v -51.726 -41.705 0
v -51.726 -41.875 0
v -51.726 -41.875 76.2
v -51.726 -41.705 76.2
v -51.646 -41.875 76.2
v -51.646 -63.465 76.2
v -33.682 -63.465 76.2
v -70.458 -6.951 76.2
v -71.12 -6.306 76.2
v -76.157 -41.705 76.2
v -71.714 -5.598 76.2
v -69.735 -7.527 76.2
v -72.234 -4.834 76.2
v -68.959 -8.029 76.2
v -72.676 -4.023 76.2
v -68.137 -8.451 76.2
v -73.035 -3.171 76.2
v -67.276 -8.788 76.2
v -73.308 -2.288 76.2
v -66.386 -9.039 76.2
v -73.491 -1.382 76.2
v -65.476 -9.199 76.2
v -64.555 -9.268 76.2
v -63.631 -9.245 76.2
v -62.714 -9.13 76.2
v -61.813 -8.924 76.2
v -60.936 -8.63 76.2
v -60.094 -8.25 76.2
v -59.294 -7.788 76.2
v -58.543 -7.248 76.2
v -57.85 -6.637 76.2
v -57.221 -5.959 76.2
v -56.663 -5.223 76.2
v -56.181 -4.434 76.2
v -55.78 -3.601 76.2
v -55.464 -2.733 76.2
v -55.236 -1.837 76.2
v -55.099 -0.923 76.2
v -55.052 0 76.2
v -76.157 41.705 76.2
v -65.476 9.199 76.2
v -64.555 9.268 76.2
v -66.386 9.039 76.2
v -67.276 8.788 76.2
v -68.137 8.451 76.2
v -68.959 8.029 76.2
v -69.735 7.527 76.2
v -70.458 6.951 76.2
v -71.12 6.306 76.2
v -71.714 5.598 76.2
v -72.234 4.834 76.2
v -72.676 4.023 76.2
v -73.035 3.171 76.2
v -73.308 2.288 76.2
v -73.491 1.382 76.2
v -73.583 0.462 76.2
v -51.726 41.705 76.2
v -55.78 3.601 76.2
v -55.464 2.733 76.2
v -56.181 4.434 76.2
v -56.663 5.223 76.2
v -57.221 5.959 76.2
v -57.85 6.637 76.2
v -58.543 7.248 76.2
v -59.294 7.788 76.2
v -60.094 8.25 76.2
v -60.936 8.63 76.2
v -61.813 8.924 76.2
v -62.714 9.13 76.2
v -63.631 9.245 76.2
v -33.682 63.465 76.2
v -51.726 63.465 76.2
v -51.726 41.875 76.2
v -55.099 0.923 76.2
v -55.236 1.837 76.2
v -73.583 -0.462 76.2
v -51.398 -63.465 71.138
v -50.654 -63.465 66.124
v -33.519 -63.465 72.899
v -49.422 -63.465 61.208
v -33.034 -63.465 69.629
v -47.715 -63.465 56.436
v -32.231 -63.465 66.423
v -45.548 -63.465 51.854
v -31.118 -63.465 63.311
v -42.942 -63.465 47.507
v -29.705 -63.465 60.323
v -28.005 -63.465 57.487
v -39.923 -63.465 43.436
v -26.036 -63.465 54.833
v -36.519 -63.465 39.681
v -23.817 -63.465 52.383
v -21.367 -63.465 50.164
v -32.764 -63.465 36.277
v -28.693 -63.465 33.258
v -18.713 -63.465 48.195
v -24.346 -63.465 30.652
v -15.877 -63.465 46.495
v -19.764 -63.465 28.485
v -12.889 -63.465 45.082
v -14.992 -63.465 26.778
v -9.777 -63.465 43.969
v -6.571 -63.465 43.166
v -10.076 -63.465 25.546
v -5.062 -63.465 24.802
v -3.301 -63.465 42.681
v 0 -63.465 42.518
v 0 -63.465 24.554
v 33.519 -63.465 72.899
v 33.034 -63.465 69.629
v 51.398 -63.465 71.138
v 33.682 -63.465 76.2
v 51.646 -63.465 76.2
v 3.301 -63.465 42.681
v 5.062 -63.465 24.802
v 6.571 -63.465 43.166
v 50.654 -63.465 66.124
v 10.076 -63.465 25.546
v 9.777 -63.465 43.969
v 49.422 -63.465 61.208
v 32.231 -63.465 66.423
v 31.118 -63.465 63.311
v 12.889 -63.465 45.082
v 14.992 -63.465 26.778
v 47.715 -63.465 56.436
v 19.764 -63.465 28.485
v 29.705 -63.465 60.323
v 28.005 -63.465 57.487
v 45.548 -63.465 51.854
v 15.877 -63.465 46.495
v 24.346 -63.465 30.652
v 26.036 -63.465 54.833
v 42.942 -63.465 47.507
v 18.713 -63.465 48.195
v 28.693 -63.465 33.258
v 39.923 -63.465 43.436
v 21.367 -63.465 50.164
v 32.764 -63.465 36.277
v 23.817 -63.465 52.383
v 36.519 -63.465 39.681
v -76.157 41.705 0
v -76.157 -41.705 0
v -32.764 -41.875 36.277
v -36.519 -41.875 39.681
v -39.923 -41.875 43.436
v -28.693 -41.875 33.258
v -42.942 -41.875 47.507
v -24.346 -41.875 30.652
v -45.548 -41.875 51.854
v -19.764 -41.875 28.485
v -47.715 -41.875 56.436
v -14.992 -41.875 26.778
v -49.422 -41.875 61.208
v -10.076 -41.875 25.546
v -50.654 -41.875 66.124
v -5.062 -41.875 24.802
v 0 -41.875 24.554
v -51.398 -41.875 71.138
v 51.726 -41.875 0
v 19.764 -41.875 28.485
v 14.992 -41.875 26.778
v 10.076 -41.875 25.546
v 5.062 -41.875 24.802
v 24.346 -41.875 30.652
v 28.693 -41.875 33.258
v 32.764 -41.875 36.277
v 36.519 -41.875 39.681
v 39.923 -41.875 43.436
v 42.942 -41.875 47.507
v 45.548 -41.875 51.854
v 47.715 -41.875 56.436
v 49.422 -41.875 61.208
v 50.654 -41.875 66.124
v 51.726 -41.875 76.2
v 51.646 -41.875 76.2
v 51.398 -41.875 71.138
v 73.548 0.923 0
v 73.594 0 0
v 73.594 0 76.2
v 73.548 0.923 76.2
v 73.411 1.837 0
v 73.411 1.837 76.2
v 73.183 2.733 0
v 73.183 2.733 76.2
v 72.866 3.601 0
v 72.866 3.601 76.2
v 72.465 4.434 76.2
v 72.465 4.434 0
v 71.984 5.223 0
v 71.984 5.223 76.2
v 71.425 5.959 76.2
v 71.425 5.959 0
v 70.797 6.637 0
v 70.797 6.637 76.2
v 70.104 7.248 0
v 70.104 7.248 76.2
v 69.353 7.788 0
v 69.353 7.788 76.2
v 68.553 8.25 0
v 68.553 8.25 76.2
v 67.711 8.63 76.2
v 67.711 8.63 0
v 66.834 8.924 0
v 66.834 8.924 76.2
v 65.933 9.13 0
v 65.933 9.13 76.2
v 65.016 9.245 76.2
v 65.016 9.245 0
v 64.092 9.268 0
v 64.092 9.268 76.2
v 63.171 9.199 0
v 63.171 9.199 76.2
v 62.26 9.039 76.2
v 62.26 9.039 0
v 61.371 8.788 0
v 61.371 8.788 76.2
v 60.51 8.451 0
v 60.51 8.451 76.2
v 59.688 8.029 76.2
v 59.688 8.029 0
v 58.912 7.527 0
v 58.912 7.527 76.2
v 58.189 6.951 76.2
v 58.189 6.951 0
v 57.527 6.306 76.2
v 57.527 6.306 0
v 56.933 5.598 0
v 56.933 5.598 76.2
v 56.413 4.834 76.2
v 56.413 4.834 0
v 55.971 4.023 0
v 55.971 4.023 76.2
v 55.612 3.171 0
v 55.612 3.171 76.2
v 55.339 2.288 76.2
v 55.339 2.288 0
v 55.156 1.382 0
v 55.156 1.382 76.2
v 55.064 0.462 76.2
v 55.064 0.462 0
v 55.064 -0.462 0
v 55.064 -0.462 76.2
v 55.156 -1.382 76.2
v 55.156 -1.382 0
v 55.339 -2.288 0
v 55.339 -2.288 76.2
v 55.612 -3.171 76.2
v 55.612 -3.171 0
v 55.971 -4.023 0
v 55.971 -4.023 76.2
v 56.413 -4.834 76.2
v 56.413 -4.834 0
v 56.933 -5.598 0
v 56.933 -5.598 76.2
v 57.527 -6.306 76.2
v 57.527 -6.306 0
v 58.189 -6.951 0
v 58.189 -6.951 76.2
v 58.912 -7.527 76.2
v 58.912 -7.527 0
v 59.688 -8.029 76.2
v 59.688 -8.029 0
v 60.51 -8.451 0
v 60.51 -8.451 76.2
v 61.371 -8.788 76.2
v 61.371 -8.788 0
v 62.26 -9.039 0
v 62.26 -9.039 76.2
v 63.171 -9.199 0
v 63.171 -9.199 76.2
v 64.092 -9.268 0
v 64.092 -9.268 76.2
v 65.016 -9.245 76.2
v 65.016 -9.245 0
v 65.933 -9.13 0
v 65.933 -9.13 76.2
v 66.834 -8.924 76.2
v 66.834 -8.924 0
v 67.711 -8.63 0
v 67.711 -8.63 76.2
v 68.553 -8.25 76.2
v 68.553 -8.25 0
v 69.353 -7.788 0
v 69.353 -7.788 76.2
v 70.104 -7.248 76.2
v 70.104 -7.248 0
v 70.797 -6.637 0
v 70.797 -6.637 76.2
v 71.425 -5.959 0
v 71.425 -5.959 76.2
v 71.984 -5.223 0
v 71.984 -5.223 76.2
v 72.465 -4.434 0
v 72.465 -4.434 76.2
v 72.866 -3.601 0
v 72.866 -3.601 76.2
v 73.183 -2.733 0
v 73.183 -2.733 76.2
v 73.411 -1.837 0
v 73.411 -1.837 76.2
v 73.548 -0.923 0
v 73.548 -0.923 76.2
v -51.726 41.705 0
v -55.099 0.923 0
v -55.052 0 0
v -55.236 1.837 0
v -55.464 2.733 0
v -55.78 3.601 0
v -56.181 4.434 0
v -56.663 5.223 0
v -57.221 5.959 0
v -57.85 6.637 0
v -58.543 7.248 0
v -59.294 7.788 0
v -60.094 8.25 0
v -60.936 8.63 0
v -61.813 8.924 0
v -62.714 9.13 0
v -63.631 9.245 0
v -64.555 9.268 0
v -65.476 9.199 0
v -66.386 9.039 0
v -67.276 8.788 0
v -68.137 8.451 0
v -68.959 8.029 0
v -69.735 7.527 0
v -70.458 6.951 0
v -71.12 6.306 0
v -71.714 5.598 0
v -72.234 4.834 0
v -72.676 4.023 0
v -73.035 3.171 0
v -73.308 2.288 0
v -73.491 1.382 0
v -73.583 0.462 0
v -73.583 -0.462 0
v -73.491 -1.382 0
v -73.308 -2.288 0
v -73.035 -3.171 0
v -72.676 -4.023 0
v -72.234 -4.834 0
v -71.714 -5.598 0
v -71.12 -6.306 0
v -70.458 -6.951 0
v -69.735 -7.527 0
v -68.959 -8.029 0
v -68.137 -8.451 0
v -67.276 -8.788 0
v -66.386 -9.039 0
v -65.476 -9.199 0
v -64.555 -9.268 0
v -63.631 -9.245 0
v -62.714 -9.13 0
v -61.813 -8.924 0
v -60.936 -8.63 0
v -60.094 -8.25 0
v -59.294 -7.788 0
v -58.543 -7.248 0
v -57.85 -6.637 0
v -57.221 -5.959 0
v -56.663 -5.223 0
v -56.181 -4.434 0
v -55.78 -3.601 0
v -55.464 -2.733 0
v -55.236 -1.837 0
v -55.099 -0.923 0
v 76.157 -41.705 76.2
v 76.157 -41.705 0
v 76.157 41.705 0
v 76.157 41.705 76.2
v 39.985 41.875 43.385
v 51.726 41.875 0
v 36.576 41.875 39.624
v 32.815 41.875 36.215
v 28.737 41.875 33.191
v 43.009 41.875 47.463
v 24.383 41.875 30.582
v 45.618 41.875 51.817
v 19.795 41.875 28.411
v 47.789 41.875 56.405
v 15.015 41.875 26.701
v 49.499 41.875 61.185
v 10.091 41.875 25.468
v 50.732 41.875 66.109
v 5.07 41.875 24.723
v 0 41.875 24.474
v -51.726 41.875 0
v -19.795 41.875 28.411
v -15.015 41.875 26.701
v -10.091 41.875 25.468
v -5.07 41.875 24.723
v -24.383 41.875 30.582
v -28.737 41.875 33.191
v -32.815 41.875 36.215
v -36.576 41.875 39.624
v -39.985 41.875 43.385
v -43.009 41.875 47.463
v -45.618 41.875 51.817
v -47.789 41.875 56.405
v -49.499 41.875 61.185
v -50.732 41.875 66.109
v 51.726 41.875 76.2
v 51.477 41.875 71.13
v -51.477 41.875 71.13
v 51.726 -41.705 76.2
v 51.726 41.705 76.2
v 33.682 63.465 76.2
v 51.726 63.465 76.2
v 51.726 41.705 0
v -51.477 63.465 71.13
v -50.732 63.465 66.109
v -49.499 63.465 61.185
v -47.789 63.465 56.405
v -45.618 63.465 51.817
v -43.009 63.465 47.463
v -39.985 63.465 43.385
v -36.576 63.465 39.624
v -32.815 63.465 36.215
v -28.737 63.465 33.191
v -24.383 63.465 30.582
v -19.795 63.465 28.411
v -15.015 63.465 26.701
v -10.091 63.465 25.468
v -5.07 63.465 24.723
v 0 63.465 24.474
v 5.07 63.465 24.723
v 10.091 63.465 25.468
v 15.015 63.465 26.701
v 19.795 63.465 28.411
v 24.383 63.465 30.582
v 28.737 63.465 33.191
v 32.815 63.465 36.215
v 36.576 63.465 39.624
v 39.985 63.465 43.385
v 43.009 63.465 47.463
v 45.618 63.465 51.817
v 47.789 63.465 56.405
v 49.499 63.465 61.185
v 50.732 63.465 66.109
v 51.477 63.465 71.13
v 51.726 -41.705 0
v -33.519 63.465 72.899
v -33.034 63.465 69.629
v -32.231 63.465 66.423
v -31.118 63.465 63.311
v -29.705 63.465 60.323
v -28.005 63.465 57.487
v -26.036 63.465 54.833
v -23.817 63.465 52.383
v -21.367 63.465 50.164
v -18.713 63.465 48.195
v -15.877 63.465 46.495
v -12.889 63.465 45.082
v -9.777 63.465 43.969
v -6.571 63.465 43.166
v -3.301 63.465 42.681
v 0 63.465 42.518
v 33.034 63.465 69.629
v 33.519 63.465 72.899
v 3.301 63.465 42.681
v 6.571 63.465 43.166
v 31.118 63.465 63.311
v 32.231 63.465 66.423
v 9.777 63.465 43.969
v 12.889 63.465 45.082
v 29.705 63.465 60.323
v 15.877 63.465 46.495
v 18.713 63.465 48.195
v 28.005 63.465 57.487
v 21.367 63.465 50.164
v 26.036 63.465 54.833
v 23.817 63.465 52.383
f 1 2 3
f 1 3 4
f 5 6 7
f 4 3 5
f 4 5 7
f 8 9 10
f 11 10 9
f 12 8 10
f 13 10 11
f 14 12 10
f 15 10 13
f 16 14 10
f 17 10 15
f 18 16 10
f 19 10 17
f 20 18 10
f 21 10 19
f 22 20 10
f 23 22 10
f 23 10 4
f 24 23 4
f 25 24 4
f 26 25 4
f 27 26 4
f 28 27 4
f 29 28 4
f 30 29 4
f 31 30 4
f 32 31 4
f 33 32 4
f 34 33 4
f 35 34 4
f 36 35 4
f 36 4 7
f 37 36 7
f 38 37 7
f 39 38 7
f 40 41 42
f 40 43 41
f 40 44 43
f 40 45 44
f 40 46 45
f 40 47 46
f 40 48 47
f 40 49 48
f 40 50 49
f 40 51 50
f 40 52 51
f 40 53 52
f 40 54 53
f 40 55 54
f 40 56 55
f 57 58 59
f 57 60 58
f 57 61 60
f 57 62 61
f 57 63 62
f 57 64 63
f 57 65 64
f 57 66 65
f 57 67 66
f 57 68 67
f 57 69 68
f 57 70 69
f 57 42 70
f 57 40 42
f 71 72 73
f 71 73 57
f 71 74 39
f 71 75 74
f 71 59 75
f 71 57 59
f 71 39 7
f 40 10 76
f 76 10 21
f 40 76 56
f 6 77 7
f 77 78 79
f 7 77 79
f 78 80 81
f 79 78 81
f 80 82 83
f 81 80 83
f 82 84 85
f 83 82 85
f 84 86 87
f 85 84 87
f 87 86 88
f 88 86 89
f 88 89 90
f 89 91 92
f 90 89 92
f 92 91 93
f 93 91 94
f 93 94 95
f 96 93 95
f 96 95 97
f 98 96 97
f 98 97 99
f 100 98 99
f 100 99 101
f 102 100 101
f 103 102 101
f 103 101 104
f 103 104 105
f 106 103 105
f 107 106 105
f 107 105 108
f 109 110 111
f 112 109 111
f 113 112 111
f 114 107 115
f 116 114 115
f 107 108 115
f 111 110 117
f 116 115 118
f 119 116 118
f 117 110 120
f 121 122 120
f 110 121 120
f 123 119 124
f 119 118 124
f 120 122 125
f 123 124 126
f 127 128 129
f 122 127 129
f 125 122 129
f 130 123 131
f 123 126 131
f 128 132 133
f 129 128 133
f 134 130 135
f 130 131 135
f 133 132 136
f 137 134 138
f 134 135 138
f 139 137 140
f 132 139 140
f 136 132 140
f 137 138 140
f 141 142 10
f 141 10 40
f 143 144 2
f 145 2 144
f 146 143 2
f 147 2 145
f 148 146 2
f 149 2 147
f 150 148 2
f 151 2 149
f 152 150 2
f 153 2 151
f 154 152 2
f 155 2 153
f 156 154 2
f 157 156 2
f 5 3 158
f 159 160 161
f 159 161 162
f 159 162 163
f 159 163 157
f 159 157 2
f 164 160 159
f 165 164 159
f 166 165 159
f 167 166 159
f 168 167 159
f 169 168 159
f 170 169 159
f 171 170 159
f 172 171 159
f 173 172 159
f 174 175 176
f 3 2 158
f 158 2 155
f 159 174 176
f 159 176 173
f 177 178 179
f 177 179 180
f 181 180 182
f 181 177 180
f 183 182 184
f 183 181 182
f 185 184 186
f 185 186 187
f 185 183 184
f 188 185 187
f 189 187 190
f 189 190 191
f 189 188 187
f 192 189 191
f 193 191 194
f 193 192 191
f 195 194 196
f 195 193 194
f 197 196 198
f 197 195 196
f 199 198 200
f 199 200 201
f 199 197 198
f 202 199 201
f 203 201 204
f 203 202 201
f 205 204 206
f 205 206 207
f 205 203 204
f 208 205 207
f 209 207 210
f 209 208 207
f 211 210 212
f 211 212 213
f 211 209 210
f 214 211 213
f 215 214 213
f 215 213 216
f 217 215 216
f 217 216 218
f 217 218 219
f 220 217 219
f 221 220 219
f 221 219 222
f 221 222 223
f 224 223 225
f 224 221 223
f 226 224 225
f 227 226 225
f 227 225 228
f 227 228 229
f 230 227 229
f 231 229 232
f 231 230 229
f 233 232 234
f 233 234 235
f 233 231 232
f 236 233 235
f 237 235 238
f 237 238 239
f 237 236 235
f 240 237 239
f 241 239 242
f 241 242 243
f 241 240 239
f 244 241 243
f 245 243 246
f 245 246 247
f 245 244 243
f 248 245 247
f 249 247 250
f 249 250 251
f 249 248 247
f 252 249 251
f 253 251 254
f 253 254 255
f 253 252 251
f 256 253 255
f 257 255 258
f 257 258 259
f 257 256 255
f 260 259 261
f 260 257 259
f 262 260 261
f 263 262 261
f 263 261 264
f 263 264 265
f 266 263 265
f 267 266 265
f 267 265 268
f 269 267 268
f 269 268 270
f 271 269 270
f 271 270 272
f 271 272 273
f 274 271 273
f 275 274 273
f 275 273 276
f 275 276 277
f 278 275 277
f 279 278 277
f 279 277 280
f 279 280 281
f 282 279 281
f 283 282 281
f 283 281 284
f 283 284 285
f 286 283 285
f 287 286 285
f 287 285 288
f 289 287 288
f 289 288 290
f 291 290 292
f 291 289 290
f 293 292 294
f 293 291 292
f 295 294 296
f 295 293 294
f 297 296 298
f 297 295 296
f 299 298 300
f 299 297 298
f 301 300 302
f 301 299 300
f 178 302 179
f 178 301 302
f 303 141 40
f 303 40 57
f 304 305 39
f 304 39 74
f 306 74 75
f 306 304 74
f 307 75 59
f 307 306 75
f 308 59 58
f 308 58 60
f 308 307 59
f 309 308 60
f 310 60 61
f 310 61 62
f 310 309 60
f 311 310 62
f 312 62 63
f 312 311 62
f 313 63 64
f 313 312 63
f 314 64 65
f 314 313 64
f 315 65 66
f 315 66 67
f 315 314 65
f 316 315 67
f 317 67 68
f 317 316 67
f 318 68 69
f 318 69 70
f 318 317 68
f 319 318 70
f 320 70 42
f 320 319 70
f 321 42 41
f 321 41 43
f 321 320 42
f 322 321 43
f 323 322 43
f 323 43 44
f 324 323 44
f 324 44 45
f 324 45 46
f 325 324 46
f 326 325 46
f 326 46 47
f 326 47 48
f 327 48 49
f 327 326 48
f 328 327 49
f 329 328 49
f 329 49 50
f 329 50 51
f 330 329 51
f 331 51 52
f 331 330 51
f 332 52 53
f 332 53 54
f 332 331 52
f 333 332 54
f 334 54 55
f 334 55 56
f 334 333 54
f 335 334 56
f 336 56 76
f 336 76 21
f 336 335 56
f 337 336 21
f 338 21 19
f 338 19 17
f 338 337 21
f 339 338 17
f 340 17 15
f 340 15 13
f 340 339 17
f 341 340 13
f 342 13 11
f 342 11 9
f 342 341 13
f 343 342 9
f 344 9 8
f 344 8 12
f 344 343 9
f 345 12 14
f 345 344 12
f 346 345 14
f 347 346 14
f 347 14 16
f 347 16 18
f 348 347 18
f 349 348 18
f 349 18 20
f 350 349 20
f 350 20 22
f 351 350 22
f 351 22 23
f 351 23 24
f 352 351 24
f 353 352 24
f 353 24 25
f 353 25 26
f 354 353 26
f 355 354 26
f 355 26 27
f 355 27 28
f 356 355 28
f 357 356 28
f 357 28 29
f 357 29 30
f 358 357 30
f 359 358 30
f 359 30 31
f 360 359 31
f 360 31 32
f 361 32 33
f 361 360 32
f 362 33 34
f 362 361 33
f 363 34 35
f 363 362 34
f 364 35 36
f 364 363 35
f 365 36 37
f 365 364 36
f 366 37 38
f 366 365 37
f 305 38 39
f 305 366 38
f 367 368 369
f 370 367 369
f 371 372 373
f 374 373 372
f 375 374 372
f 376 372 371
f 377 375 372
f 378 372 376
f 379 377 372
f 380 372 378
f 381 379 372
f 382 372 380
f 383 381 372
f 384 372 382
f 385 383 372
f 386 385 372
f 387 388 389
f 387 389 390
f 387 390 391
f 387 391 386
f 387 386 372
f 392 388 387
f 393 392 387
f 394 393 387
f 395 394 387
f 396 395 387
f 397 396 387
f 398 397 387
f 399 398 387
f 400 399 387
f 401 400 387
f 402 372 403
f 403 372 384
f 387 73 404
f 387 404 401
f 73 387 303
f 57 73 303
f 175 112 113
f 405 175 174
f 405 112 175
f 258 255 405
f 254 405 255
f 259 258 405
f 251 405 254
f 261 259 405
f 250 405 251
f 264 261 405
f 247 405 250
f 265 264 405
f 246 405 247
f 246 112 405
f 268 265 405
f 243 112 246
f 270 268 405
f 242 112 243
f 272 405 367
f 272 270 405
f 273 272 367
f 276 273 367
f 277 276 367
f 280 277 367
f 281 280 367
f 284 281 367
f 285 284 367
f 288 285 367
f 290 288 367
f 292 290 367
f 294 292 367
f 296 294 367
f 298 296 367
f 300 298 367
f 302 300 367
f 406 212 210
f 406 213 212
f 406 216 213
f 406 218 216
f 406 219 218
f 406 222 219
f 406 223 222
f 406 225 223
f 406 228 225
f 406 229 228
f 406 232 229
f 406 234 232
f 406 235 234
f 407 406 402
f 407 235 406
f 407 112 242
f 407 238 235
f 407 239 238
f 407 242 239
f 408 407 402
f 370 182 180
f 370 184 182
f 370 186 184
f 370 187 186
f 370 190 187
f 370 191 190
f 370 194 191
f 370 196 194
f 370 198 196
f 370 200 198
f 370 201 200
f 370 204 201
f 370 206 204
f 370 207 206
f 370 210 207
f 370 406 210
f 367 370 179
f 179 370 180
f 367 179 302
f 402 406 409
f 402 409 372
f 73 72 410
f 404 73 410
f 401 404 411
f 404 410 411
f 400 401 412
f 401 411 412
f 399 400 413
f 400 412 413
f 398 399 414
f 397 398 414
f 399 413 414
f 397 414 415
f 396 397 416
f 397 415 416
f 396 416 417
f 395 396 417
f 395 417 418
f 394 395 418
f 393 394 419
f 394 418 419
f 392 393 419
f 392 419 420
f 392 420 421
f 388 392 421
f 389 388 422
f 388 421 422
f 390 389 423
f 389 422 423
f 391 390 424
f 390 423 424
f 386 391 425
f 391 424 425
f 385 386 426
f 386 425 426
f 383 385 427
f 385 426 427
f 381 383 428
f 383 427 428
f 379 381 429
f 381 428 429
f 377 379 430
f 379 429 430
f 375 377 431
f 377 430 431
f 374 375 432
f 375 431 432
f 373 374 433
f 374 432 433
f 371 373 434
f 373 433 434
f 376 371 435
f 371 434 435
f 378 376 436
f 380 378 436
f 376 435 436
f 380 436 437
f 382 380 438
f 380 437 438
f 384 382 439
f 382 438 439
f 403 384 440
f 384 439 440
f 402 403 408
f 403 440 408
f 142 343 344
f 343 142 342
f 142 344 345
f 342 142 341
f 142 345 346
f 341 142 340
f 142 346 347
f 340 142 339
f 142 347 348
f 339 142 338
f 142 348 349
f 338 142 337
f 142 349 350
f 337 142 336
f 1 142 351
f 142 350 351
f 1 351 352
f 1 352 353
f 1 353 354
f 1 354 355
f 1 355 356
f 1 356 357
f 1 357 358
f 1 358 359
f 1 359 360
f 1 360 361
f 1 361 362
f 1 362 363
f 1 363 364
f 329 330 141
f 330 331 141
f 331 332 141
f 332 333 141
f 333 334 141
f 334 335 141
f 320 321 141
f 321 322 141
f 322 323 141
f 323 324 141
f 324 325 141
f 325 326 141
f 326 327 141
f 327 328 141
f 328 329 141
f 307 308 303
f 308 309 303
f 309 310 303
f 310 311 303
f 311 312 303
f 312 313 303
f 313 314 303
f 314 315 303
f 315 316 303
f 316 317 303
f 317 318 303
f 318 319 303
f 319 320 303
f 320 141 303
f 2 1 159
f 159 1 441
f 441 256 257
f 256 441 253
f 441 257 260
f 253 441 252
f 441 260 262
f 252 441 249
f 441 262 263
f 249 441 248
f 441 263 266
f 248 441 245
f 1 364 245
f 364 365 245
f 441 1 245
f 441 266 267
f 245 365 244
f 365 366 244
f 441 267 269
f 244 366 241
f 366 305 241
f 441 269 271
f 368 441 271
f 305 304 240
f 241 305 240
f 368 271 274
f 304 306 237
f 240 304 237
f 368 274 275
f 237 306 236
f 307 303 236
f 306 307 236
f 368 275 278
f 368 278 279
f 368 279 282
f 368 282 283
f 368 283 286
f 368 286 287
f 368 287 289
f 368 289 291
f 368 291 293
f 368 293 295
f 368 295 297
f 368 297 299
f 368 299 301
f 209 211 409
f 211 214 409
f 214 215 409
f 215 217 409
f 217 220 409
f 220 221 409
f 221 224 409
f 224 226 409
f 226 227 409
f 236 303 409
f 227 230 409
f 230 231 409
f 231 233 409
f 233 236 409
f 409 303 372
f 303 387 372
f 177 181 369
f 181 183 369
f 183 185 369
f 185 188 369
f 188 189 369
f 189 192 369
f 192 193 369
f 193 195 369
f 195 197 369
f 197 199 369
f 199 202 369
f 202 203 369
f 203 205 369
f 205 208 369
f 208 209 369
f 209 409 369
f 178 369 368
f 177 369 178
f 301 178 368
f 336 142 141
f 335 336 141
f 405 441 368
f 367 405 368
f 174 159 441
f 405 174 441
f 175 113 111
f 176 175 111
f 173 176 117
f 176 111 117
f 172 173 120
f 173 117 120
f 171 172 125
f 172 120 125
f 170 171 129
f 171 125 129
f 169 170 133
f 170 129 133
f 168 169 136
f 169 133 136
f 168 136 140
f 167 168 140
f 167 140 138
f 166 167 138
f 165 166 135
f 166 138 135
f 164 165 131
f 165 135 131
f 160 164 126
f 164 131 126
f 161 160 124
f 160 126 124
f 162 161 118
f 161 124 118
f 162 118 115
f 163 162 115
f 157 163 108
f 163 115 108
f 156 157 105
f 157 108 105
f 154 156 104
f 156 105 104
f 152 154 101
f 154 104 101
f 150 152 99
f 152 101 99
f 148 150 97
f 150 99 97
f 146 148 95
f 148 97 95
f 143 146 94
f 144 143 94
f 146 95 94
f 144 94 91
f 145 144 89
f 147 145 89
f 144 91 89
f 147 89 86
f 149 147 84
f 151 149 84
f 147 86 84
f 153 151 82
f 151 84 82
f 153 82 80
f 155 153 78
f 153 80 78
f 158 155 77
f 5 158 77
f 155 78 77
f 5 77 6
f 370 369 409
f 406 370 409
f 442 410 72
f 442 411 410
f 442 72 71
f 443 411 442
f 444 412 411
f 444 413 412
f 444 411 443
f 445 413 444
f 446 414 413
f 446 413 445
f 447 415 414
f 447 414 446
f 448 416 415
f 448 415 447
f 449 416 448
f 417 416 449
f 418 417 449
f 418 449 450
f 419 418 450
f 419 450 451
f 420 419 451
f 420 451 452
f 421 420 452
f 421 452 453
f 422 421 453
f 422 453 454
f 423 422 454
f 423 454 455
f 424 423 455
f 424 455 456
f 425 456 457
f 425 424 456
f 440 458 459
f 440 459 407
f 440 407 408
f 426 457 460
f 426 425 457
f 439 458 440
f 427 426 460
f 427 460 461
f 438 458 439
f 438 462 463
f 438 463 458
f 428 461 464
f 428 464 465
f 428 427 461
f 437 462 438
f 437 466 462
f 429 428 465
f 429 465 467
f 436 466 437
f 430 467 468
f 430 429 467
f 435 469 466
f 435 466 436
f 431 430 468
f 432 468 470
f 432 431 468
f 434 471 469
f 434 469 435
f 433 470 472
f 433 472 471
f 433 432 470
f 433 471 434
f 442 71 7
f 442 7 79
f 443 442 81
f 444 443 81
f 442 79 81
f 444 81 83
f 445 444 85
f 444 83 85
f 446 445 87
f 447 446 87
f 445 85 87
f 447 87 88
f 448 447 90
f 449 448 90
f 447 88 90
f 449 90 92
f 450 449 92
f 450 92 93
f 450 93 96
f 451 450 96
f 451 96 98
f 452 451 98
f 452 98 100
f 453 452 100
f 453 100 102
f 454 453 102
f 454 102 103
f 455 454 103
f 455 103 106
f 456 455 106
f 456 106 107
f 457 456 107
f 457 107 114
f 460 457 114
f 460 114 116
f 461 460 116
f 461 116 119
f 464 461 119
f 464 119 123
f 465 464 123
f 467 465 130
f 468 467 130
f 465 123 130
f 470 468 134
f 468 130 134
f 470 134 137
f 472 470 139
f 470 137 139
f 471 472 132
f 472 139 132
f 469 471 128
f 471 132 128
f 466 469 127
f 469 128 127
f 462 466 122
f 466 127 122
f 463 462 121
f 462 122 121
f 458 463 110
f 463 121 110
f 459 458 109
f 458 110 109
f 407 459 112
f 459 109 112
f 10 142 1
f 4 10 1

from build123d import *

# Parameters (mm, degrees)
F0_W     = 24.4314651938
F0_H     = 83.410562446
F0_R     = 9.271
F0_W_2   = 103.4520039098
F0_H_2   = 21.7592747342
F1_DEPTH = 76.2
F3_DEPTH = 172.974
F4_DEPTH = 21.59
F6_DEPTH = 21.59


with BuildPart() as f1:
    # F0 (on Top) → F1 (new body)
    with BuildSketch(Plane.XY):
        with Locations((63.9417345518, 0)):
            Rectangle(F0_W, F0_H)
        with Locations((64.3234781713, 0)):
            Circle(F0_R, mode=Mode.SUBTRACT)
        Rectangle(F0_W_2, F0_H)
        with Locations((0, 52.5849185901)):
            Rectangle(F0_W_2, F0_H_2)
        with Locations((-63.9417345518, 0)):
            Rectangle(F0_W, F0_H)
        with Locations((-64.3234781713, 0)):
            Circle(F0_R, mode=Mode.SUBTRACT)
        with Locations((0, -52.5849185901)):
            Rectangle(F0_W_2, F0_H_2)
    extrude(amount=F1_DEPTH)

    # F2 (on face) → F3 (cut)
    with BuildSketch(Plane.XZ.offset(63.4645559572)):
        with BuildLine():
            Line((33.6816743844, 76.2), (-33.6816743844, 76.2))
            ThreePointArc((-33.6816743844, 76.2), (0, 42.5183256156), (33.6816743844, 76.2))
        make_face()
    extrude(amount=-F3_DEPTH, mode=Mode.SUBTRACT)

    # F2 (on face) → F4 (cut)
    with BuildSketch(Plane.XZ.offset(63.4645559572)):
        with BuildLine():
            ThreePointArc((51.6462088302, 76.2), (0, 24.5537911698), (-51.6462088302, 76.2))
            Line((-51.6462088302, 76.2), (-51.7260019549, 76.2))
            Line((-51.7260019549, 76.2), (-51.7260019549, 0))
            Line((-51.7260019549, 0), (51.7260019549, 0))
            Line((51.7260019549, 0), (51.7260019549, 76.2))
            Line((51.7260019549, 76.2), (51.6462088302, 76.2))
        make_face()
    extrude(amount=-F4_DEPTH, mode=Mode.SUBTRACT)

    # F5 (on face) → F6 (cut)
    with BuildSketch(Plane(origin=(0, 63.4645559572, 0), x_dir=(-1, 0, 0), z_dir=(0, 1, 0))):
        with BuildLine():
            ThreePointArc((51.7260019549, 76.2), (0, 24.4739980451), (-51.7260019549, 76.2))
            Line((-51.7260019549, 76.2), (-51.7260019549, 0))
            Line((-51.7260019549, 0), (51.7260019549, 0))
            Line((51.7260019549, 0), (51.7260019549, 76.2))
        make_face()
    extrude(amount=-F6_DEPTH, mode=Mode.SUBTRACT)


solid = f1.part
